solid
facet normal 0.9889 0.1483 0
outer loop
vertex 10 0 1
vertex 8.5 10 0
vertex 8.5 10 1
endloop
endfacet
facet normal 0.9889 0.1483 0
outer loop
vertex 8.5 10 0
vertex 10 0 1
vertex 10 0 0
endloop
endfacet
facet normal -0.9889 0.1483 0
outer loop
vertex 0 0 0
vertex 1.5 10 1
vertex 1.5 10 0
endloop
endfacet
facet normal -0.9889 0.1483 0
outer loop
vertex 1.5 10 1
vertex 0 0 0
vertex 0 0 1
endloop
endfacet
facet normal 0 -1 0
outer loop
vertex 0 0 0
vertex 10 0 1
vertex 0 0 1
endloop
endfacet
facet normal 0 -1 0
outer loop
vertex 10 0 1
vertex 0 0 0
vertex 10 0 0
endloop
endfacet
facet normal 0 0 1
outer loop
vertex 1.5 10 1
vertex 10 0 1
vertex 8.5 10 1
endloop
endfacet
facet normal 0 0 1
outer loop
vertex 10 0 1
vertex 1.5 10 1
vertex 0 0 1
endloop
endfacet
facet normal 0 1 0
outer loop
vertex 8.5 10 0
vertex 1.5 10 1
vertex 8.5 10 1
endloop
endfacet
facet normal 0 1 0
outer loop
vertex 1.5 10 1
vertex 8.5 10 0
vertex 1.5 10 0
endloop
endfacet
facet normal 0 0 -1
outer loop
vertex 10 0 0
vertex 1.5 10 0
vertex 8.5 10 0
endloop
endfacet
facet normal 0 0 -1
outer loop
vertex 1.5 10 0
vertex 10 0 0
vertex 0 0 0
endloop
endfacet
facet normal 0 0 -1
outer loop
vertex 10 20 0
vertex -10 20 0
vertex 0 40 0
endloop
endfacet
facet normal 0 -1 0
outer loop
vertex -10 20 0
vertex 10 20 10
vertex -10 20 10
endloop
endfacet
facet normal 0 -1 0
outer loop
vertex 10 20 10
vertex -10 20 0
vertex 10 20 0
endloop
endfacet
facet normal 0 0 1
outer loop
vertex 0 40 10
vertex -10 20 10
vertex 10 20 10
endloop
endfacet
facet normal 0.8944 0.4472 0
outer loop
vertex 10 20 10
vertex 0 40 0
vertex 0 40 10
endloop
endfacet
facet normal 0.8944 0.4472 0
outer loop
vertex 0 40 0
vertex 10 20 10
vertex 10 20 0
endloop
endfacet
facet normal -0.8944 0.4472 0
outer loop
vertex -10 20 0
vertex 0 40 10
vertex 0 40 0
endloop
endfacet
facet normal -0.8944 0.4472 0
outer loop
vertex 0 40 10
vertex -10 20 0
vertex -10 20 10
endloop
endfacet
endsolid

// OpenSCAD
module trapezoid (w_b, w_t, h, l, centre = false)
{
    top_offset = ( w_b - w_t )/2;

    points = [
    [0,0],
    [w_b,0],
    [top_offset+w_t,h],
    [top_offset,h]
    ];

    trans = (centre == true) ? [-w_b/2,-h/2,0] : [0,0,0] ;

    translate(trans)
        linear_extrude(l)
            polygon(points);
}

trapezoid(10,7,10,1);

module triangle (w_b, h, l, centre = false)
{

    points = [
    [0,0],
    [w_b,0],
    [w_b/2,h],
    ];

    trans = (centre == true) ? [-w_b/2,-h/2,0] : [0,0,0] ;

    translate(trans)
        linear_extrude(l)
            polygon(points);
}

translate([0,30,0])
triangle(20,20,10,true);
